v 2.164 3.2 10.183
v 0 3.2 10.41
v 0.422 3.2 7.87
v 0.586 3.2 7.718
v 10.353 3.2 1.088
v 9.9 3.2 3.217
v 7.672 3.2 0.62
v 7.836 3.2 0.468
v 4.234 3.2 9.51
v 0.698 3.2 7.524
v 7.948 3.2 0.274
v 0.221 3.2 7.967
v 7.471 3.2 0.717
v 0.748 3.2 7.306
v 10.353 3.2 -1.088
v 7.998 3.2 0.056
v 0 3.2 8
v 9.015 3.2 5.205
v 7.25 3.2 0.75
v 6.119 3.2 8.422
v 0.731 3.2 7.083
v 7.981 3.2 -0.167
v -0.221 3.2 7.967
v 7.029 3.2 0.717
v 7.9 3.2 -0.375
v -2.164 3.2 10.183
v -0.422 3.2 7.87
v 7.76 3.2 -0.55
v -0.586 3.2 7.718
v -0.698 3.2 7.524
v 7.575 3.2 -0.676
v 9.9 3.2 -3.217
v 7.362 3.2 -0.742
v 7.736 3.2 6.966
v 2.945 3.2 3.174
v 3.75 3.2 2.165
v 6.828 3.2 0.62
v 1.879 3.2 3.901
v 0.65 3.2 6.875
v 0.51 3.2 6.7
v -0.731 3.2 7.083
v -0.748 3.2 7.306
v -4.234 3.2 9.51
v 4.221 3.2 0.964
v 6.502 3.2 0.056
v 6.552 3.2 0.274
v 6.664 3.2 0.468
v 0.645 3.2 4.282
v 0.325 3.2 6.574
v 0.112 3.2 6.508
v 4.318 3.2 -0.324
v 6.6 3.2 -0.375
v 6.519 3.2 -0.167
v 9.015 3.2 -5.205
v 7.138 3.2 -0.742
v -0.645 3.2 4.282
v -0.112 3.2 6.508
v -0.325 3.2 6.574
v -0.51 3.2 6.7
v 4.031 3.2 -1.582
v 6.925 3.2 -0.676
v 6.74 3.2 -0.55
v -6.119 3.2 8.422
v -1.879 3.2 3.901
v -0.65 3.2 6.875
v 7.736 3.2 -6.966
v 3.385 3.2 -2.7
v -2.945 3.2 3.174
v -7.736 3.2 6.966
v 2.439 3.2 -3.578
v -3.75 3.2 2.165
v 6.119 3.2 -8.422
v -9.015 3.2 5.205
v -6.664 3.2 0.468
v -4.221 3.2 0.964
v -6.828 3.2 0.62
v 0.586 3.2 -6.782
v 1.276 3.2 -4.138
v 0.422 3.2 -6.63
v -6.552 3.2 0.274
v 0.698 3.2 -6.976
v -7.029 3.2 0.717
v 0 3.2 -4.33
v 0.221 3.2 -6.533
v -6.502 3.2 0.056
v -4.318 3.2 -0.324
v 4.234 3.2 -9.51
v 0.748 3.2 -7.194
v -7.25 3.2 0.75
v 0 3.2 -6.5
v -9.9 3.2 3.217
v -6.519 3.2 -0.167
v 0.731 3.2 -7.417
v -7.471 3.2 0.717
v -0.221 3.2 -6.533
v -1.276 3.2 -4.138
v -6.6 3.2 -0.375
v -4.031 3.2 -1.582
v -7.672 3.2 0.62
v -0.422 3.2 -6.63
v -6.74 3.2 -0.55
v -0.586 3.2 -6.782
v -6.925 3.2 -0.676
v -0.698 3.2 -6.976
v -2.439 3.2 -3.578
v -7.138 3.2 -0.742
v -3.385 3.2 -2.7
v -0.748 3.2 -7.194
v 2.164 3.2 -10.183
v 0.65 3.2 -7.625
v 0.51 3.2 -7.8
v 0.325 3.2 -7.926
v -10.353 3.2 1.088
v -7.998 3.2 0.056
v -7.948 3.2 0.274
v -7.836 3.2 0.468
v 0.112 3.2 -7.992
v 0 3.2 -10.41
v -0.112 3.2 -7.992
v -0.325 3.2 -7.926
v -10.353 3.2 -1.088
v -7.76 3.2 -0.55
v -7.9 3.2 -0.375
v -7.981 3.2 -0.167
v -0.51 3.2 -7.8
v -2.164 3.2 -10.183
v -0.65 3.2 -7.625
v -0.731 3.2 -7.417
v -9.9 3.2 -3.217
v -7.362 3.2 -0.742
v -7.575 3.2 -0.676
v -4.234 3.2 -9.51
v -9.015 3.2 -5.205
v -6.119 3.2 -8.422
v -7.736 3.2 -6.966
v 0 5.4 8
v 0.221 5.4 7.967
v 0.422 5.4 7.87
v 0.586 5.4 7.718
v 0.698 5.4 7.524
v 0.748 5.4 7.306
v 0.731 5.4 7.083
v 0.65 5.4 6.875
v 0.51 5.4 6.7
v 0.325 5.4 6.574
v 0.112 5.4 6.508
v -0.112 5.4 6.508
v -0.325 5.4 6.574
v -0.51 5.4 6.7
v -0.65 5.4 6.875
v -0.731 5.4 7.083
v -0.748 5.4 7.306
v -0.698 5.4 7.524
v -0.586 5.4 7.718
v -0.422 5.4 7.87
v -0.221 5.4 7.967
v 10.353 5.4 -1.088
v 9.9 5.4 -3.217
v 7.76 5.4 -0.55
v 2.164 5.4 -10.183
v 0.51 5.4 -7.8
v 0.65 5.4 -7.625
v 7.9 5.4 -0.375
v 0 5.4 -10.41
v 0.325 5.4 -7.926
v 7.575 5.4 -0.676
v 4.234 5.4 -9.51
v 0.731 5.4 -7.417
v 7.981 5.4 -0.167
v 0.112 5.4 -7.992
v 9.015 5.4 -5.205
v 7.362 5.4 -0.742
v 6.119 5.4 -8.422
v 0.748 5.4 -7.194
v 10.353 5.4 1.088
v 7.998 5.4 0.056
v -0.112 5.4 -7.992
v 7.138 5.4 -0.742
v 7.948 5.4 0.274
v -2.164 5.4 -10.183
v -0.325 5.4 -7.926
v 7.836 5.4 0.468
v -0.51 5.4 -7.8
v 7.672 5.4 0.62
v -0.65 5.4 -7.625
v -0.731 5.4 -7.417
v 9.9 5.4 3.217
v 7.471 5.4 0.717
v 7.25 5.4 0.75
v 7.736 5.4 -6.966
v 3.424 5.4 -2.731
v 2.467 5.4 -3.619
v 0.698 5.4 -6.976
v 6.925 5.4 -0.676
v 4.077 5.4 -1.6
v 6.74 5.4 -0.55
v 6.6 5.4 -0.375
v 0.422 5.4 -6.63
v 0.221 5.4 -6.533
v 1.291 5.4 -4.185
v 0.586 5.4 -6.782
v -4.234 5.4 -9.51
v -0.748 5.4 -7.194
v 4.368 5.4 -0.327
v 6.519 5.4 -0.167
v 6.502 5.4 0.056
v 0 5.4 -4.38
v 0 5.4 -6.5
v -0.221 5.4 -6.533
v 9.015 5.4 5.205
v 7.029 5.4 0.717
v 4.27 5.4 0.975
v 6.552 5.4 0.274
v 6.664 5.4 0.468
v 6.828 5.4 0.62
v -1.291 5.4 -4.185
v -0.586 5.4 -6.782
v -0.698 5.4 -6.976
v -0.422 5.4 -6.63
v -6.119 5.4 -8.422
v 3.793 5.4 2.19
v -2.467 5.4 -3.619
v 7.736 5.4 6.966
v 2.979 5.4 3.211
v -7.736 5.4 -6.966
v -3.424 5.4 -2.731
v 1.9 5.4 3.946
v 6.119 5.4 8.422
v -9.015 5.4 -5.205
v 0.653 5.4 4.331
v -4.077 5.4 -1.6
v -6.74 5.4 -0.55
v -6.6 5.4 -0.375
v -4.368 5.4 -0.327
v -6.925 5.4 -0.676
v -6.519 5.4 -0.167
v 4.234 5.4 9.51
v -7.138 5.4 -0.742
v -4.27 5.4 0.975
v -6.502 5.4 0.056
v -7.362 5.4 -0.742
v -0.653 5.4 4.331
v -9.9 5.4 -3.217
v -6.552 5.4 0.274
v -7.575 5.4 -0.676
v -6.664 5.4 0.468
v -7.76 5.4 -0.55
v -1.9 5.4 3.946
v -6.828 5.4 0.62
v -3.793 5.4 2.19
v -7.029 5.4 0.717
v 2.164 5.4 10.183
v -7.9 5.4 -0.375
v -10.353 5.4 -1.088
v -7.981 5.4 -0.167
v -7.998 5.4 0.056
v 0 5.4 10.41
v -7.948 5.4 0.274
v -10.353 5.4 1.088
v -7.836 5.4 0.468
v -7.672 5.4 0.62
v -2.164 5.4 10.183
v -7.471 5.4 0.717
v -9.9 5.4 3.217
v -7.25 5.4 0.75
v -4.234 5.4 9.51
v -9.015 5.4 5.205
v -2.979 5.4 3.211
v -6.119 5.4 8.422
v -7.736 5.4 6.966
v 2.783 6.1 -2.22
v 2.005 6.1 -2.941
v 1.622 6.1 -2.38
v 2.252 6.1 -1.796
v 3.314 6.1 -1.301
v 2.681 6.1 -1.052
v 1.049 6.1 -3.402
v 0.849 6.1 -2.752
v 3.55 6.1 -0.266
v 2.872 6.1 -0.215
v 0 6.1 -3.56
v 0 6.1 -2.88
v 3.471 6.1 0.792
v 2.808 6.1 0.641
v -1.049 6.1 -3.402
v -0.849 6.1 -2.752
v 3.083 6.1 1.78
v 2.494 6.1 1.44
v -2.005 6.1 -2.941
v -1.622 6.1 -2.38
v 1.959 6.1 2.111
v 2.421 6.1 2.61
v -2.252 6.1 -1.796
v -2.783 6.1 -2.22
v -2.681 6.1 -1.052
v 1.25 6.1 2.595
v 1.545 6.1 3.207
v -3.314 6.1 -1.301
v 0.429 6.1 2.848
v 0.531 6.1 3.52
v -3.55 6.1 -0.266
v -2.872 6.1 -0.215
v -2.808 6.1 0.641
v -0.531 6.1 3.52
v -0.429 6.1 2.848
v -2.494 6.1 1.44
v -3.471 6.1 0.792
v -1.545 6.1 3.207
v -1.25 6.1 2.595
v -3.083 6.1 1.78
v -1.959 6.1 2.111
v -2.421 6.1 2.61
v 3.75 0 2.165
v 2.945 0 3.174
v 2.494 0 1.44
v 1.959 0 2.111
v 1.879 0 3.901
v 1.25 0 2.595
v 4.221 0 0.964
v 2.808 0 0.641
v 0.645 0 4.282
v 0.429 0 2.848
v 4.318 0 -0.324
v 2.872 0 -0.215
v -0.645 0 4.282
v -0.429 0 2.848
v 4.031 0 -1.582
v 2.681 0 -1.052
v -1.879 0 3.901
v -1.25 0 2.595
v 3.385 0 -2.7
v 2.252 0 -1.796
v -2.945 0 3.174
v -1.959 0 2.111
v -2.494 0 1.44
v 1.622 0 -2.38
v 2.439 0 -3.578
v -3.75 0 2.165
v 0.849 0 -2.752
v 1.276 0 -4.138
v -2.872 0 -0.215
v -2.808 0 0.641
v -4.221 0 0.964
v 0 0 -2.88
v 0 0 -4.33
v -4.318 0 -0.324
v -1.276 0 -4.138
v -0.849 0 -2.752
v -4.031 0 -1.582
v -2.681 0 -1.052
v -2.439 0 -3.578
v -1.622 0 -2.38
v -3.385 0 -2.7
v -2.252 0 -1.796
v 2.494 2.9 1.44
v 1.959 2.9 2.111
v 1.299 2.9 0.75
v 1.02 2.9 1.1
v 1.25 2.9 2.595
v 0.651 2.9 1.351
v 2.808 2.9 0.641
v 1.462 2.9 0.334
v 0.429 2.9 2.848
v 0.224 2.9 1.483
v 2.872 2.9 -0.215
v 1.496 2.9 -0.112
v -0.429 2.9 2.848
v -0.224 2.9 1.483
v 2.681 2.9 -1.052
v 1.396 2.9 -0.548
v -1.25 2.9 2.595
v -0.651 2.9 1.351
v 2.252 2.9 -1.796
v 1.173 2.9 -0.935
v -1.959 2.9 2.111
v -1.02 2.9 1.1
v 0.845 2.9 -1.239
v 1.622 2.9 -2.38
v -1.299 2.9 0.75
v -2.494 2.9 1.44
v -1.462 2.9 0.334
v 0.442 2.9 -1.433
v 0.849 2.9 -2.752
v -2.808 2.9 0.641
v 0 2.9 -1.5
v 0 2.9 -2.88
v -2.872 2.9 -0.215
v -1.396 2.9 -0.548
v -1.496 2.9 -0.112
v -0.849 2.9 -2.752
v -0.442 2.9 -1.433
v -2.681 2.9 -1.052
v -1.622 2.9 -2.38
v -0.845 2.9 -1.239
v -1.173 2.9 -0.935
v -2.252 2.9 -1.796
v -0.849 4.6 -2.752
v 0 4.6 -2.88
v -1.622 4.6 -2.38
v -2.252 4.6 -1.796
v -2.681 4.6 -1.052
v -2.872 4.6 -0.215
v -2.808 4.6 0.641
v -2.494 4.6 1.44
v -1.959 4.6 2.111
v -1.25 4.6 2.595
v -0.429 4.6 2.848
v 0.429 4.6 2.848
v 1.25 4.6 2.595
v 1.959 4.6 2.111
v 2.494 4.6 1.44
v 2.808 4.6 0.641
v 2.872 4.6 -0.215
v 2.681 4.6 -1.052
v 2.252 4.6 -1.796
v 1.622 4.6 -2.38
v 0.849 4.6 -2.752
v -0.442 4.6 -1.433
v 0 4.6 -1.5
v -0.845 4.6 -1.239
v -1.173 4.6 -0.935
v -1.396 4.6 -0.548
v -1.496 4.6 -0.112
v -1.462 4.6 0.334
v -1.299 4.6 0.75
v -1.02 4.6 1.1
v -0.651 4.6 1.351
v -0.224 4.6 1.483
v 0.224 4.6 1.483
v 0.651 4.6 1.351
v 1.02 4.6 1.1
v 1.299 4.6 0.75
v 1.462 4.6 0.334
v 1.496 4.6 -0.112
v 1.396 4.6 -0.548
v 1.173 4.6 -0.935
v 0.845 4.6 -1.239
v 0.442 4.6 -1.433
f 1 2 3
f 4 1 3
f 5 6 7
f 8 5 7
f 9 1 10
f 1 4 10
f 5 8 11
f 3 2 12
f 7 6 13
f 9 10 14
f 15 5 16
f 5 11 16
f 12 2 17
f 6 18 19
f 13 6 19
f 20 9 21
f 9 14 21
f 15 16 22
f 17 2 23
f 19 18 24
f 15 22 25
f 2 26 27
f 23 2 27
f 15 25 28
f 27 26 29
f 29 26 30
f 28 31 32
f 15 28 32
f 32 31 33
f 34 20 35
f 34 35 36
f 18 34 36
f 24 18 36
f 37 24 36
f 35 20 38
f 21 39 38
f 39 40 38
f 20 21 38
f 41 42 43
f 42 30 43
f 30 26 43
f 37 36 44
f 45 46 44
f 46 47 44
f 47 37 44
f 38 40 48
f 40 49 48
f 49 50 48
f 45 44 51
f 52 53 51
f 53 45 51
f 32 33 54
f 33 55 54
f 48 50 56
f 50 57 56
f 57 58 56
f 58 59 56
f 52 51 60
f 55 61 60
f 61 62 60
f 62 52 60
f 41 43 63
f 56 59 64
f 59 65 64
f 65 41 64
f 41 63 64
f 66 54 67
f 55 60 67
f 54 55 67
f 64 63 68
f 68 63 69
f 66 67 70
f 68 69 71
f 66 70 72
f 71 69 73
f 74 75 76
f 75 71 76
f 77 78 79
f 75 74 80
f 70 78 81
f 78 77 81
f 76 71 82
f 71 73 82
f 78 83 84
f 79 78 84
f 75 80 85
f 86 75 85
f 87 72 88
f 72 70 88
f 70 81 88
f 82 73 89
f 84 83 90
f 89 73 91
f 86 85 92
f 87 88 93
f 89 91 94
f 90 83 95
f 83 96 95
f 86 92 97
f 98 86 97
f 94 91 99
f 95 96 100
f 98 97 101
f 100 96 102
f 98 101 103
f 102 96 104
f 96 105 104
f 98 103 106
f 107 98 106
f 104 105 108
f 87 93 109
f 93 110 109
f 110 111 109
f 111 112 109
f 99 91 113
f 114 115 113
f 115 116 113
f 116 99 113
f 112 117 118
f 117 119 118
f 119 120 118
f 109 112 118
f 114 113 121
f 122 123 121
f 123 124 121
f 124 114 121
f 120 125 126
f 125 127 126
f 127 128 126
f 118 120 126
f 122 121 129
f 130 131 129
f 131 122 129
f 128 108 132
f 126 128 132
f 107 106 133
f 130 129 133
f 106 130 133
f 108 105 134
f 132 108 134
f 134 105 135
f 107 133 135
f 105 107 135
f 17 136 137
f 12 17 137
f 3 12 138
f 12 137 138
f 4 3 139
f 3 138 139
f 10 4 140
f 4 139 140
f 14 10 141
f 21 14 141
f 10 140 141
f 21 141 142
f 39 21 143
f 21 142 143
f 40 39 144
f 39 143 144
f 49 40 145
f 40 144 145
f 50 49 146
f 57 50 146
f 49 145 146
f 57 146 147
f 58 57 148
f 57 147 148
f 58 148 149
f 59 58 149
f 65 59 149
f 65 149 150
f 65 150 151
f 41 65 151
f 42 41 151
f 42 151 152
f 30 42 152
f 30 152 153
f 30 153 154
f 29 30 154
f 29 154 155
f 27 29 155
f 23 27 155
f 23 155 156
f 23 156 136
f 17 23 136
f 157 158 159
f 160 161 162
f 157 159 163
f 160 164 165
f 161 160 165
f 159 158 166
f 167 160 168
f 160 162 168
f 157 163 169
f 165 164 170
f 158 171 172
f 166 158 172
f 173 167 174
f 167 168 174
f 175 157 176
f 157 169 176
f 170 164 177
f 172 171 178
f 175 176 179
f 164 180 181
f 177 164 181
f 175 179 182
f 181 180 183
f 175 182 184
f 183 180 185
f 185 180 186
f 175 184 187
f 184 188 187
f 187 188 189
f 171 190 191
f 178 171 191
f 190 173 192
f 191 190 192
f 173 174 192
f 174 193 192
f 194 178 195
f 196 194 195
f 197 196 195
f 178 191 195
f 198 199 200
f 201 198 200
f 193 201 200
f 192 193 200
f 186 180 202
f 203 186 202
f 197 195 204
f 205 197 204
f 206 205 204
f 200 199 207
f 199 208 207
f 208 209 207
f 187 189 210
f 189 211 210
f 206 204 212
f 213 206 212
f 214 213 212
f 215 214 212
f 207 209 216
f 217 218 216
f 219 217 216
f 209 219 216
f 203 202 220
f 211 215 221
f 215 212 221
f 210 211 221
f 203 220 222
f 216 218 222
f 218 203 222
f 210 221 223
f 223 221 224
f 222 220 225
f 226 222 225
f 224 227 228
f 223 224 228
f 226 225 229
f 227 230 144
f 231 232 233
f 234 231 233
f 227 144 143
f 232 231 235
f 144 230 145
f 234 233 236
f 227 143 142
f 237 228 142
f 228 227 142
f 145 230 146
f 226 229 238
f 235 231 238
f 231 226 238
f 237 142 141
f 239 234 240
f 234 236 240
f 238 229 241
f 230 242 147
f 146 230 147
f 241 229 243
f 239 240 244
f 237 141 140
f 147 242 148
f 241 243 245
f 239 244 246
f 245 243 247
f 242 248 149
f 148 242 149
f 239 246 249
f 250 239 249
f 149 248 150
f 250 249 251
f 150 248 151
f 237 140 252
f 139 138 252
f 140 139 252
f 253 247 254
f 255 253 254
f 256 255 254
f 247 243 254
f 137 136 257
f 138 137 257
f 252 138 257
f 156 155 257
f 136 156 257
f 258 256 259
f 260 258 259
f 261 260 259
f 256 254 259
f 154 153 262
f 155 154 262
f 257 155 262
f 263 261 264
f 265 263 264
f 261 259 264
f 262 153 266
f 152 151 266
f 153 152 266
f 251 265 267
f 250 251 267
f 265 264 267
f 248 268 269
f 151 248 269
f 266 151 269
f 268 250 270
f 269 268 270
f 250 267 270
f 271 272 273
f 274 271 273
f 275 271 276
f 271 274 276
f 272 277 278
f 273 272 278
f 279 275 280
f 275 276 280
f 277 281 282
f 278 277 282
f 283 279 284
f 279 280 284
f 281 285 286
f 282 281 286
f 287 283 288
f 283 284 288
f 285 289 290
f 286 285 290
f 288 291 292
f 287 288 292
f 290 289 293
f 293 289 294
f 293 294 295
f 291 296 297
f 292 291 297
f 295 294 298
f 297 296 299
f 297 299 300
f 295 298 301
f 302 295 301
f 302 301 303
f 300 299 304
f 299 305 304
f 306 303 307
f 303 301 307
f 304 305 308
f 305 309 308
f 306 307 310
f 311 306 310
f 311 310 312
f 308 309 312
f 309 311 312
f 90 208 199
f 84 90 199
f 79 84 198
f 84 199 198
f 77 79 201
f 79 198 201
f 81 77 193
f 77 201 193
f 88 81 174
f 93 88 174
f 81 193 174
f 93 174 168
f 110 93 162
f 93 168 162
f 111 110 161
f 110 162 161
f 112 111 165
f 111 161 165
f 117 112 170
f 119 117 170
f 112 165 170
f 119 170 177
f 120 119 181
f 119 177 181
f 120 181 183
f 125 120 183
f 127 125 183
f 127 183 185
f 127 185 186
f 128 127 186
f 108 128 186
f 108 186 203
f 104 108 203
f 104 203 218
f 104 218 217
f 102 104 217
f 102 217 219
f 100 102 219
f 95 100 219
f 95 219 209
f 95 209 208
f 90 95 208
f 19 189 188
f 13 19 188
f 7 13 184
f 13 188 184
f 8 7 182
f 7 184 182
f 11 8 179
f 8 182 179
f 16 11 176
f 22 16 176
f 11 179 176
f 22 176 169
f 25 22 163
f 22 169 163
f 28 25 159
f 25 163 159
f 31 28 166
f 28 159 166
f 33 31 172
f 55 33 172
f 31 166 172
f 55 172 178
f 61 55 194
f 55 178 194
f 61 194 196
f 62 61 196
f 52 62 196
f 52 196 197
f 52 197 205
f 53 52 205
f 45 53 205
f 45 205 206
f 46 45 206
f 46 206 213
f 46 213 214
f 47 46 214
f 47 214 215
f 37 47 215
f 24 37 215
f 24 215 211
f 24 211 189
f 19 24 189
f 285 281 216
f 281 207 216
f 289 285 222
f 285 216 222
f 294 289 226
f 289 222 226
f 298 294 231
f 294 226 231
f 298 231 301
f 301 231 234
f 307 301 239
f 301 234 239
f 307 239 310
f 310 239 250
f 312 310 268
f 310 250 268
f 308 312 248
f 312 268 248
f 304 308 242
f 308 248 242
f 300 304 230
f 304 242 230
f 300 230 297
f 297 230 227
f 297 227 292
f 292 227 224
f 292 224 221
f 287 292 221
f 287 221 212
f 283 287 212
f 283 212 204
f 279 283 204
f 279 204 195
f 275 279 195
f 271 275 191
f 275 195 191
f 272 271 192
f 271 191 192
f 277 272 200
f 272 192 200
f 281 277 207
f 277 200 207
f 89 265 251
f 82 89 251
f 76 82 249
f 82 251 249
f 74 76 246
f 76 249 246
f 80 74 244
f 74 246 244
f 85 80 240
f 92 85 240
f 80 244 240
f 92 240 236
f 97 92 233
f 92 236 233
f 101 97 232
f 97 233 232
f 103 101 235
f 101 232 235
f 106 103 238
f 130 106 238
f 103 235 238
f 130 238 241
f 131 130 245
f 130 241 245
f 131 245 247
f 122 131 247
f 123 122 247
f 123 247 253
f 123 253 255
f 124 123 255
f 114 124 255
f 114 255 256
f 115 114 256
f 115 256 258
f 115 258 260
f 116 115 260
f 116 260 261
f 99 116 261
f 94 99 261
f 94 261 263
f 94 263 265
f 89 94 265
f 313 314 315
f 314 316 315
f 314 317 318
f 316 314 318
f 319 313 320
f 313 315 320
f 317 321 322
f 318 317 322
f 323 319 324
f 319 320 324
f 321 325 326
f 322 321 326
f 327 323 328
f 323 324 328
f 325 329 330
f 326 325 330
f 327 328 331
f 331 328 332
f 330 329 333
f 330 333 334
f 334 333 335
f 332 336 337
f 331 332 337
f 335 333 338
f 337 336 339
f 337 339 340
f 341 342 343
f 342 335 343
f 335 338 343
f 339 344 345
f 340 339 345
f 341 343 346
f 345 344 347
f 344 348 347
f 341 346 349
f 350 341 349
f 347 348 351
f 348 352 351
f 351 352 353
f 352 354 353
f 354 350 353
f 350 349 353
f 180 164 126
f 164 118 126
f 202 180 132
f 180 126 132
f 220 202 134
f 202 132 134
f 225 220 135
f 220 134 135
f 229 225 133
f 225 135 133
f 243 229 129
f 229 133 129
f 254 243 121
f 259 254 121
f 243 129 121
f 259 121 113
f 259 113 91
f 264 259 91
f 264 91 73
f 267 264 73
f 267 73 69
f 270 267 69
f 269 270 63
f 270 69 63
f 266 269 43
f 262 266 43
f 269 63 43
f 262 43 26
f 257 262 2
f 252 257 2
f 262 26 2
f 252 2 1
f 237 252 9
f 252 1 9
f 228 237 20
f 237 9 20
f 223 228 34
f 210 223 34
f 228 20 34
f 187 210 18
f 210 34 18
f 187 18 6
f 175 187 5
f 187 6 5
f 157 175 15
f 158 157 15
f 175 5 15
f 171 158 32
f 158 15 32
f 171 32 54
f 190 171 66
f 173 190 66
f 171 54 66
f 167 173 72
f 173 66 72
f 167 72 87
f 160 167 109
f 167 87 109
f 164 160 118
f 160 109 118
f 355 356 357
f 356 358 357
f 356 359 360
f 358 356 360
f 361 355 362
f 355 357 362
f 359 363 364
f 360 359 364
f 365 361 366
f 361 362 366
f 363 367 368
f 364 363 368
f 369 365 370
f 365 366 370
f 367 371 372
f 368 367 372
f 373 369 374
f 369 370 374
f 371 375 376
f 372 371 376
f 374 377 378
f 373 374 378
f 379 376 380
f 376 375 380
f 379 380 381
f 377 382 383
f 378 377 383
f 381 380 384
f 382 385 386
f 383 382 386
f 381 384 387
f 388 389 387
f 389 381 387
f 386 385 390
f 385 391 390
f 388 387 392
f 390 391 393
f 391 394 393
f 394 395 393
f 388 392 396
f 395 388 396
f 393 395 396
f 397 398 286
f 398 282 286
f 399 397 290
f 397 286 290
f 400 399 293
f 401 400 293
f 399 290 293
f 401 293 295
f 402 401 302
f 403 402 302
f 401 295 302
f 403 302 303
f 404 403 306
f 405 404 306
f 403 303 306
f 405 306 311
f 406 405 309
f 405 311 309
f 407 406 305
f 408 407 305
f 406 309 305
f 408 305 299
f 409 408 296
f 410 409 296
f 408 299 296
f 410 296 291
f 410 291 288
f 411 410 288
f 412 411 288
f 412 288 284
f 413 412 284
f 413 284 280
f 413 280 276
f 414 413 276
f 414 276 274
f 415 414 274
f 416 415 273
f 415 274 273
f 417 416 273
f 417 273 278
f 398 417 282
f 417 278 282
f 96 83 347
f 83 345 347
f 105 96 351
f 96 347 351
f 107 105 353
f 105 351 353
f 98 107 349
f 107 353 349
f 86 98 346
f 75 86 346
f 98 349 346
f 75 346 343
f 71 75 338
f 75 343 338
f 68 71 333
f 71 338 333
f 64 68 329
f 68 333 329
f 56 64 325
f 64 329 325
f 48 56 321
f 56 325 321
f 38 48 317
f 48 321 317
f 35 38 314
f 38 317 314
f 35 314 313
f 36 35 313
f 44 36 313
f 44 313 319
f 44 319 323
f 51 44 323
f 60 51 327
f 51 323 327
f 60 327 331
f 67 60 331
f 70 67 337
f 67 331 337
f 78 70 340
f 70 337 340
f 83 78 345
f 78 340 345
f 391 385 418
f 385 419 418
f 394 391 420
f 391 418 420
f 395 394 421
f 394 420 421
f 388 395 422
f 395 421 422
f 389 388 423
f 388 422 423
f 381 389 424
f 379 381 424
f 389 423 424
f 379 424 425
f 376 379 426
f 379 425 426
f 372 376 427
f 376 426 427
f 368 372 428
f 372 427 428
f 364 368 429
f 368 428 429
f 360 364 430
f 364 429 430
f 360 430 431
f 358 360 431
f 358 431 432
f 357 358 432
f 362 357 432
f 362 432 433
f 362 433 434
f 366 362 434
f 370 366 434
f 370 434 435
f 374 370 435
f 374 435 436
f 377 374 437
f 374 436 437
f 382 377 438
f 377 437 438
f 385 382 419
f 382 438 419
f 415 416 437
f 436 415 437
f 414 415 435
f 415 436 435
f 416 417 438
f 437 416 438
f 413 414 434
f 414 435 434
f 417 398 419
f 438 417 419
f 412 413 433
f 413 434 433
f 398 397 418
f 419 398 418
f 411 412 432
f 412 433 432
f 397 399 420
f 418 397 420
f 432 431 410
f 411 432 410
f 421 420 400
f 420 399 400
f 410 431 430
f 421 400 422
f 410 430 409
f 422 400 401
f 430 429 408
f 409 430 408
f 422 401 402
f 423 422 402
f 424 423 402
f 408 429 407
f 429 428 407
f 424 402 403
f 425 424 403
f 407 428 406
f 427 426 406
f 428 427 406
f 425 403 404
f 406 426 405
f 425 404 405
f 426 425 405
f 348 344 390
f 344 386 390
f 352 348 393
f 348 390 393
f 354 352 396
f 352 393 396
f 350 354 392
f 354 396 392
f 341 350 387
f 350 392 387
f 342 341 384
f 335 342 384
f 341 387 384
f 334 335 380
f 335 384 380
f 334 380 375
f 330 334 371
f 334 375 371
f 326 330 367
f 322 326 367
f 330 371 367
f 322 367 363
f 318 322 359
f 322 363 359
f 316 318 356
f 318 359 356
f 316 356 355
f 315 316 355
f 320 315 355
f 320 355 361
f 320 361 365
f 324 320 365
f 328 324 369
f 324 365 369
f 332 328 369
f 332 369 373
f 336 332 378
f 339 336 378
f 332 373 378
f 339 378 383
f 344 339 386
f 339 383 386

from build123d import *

# Parameters (mm, degrees)
SKETCH_2_R            = 0.75
CUT_EXTRUDE_619_DEPTH = 16.681077769


with BuildPart() as part:
    # 草图1 → 旋转1 (revolve)
    with BuildSketch(Plane.XY, mode=Mode.PRIVATE) as revolve_1_sk:
        Polygon((-2.88, 0), (-2.88, 2.9), (-1.5, 2.9), (-1.5, 4.6), (-2.88, 4.6), (-2.88, 6.1), (-3.56, 6.1), (-4.38, 5.4), (-10.41, 5.4), (-10.41, 3.2), (-4.33, 3.2), (-4.33, 0), align=None)
    revolve(revolve_1_sk.sketch.rotate(Axis((0, 0, 0), (0, 1, 0)), 270), axis=Axis((0, 0, 0), (0, 1, 0)))

    # 草图2 → Cut-Extrude 619 (cut, through all)
    with BuildSketch(Plane(origin=(0, 5.4, 0), x_dir=(1, 0, 0), z_dir=(0, 1, 0))):
        with Locations(Location((0, 7.25, 0), (0, 0, 270))):
            Circle(SKETCH_2_R)
        with Locations(Location((7.25, 0, 0), (0, 0, 270))):
            Circle(SKETCH_2_R)
        with Locations(Location((0, -7.25, 0), (0, 0, 270))):
            Circle(SKETCH_2_R)
        with Locations(Location((-7.25, 0, 0), (0, 0, 270))):
            Circle(SKETCH_2_R)
    extrude(amount=-CUT_EXTRUDE_619_DEPTH, mode=Mode.SUBTRACT)


solid = part.part
